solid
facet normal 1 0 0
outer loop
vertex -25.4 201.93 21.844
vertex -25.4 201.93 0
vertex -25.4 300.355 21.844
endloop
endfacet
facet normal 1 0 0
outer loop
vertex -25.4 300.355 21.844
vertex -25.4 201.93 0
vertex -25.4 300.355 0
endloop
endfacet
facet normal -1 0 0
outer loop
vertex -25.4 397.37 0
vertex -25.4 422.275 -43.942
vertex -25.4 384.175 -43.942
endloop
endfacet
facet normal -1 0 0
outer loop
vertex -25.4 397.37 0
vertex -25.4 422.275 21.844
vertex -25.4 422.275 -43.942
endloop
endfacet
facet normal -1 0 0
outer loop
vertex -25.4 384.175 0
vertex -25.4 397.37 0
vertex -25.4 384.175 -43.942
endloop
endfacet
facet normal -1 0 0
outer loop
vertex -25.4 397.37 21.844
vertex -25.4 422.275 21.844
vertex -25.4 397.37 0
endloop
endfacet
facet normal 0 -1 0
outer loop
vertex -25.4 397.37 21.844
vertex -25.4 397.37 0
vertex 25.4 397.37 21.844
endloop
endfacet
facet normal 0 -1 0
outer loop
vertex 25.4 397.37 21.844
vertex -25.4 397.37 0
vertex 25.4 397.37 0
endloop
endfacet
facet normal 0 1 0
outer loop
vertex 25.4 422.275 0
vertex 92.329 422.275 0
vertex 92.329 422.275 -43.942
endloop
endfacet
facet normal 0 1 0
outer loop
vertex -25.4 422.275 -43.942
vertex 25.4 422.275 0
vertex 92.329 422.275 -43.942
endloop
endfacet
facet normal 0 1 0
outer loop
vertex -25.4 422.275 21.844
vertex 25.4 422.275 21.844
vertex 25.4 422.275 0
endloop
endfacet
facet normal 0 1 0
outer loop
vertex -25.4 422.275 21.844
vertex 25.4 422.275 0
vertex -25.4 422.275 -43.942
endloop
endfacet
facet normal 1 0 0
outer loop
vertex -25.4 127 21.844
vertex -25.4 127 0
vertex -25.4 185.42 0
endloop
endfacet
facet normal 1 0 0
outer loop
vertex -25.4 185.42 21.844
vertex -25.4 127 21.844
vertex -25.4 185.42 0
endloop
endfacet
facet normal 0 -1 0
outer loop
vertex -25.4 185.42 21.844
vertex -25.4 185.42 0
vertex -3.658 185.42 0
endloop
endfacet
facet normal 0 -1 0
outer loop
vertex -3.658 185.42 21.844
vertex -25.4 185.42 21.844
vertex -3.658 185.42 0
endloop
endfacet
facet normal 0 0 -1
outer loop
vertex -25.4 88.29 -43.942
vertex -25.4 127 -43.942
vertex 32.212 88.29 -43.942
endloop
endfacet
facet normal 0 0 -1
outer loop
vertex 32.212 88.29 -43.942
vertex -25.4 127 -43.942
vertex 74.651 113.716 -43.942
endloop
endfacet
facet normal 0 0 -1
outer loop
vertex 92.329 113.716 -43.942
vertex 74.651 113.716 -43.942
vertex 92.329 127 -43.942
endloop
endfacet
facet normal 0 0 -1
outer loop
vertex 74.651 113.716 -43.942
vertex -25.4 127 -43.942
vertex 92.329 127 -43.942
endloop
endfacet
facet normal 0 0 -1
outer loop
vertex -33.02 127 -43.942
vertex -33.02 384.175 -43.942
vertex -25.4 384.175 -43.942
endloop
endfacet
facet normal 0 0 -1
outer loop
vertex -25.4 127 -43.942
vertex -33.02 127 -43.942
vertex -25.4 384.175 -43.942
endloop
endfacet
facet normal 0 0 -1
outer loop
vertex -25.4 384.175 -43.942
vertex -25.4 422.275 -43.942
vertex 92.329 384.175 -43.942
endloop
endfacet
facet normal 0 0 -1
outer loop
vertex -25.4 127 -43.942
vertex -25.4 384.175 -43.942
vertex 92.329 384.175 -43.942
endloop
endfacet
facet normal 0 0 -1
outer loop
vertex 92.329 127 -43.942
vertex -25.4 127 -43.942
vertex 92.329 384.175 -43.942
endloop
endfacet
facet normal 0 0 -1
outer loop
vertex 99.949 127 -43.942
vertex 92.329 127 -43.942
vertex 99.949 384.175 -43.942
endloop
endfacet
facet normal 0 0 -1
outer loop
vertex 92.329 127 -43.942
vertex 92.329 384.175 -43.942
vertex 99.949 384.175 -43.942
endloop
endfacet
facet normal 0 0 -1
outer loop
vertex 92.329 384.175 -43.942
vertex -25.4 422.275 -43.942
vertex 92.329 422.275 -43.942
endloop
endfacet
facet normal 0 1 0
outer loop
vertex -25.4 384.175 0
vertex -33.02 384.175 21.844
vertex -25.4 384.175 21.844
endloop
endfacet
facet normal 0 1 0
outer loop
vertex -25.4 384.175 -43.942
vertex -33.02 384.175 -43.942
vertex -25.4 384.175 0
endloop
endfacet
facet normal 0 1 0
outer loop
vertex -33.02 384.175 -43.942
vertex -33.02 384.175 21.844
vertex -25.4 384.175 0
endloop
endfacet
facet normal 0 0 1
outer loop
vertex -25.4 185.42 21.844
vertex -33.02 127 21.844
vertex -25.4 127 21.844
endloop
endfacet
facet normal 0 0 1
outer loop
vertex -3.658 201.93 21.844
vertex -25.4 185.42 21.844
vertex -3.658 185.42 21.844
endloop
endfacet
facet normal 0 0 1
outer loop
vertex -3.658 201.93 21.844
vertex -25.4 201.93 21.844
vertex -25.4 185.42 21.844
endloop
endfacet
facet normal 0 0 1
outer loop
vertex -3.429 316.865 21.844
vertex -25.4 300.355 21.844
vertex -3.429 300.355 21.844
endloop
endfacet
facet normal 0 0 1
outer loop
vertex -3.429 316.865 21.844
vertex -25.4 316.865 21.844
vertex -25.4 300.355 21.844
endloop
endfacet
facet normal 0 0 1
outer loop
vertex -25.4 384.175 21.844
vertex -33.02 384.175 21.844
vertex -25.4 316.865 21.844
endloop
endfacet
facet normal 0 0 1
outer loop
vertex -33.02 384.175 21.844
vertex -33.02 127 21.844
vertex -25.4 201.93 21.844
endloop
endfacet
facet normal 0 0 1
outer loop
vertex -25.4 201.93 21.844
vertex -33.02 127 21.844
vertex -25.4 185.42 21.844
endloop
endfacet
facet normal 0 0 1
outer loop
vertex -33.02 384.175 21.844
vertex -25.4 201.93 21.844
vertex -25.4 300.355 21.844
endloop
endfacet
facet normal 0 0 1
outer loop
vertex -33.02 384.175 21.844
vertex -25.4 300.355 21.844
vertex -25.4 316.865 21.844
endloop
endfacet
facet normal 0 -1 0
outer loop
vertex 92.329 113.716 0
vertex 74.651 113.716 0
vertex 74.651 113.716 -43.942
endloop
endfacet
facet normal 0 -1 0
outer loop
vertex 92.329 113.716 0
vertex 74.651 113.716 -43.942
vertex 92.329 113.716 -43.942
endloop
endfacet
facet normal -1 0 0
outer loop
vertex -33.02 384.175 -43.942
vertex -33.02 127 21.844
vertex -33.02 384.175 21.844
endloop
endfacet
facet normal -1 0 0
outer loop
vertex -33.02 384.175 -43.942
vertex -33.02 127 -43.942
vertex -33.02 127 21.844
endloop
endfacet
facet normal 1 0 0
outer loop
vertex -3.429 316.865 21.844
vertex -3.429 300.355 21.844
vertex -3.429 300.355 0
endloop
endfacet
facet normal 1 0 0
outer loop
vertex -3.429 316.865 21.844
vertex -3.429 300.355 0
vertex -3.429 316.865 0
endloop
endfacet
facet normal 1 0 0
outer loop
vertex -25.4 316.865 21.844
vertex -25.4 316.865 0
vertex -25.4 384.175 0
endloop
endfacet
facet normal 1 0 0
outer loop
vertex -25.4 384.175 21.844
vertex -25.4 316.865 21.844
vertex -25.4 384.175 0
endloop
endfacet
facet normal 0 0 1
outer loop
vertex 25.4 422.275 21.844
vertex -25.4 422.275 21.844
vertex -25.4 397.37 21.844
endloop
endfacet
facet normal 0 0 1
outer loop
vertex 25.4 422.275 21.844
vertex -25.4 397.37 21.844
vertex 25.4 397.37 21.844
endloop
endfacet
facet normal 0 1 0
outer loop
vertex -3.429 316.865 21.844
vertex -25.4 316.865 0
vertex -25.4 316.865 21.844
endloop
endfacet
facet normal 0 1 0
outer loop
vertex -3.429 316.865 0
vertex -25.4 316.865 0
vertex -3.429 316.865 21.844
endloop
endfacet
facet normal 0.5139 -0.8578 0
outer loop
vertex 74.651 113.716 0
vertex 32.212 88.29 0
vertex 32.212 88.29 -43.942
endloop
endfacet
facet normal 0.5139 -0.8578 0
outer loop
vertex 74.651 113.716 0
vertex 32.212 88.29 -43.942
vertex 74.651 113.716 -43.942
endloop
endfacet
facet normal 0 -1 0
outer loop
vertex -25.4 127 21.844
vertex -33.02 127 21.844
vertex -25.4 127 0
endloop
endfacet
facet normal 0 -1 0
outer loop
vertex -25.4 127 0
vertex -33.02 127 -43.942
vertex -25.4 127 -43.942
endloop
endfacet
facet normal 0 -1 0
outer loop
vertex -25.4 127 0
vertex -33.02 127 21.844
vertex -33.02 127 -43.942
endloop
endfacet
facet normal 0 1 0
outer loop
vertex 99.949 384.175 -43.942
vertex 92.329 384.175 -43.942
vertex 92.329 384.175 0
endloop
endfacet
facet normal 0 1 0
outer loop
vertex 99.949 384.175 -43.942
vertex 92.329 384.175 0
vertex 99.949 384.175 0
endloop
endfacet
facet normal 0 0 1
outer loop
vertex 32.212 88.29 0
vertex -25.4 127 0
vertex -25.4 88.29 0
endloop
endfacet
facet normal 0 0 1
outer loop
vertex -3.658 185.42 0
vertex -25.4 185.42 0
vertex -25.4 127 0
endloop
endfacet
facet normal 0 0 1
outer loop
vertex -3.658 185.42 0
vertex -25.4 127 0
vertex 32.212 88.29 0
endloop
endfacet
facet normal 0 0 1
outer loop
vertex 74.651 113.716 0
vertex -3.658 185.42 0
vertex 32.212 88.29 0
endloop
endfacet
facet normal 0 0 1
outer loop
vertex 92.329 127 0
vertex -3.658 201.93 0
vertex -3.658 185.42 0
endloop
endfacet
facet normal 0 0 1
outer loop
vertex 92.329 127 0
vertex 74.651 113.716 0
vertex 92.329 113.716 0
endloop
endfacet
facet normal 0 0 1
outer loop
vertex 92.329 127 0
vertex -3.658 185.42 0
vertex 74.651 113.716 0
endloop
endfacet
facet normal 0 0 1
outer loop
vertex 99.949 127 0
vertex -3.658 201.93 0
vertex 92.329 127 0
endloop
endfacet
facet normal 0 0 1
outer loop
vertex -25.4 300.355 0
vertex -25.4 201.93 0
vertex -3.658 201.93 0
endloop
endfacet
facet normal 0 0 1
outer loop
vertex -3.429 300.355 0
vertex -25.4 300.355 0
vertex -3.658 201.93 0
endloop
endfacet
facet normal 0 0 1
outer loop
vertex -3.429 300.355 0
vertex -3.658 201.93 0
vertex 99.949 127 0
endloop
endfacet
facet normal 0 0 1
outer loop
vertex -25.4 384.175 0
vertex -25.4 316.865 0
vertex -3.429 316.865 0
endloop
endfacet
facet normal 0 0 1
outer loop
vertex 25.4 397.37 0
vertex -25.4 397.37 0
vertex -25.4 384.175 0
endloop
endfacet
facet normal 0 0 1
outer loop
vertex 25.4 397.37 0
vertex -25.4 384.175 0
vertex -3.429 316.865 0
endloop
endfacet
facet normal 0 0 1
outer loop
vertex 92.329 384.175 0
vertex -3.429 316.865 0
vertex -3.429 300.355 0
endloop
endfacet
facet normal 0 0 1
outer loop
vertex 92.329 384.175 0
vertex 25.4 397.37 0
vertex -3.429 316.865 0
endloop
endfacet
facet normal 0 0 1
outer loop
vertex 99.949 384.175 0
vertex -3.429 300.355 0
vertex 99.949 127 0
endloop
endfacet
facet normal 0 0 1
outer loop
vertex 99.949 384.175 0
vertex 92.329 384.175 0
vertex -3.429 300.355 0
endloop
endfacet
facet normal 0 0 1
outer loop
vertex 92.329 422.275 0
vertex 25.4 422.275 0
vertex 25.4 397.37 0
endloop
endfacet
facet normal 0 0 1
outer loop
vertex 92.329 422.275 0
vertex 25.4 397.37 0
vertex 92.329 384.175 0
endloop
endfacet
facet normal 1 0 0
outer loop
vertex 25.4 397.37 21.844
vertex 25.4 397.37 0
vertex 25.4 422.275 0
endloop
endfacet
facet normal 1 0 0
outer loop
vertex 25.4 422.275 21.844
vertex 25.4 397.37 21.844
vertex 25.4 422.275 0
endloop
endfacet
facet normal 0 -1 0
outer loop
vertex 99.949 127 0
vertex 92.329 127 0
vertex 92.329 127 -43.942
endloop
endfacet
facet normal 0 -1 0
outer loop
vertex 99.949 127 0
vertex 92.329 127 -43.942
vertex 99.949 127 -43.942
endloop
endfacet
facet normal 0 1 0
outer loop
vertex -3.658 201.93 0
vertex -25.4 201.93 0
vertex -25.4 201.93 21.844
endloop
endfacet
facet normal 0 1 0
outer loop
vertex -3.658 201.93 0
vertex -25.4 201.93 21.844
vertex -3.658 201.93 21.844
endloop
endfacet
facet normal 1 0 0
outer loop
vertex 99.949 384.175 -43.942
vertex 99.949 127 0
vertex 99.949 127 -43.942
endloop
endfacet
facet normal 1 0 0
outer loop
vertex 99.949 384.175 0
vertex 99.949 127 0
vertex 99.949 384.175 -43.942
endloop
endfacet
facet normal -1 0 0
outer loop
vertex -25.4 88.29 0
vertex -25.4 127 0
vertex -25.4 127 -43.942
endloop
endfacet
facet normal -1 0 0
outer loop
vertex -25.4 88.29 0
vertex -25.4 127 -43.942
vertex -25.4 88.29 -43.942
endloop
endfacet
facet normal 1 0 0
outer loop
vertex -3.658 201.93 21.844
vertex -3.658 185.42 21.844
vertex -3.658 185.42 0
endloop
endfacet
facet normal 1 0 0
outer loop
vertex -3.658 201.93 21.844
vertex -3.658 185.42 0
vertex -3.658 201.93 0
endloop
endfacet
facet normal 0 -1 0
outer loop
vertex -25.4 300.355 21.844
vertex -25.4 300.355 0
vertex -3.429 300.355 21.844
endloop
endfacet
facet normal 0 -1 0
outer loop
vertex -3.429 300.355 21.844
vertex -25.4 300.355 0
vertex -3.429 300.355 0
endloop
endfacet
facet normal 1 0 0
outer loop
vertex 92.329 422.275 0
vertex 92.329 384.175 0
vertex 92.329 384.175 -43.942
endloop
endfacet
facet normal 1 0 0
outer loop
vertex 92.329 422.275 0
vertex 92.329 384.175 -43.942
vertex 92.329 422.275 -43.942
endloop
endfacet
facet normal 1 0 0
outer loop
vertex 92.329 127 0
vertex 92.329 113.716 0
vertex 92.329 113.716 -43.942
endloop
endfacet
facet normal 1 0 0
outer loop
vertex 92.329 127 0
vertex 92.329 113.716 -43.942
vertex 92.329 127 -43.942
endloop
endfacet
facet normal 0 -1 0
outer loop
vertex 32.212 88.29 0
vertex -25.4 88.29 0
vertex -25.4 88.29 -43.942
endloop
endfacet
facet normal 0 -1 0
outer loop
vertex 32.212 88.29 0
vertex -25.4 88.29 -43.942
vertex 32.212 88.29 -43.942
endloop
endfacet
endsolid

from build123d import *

# Parameters (mm, degrees)
BOSS_EXTRUDE1_DEPTH = 43.942
SKETCH2_6_W         = 50.8
SKETCH2_6_H         = 24.9047
BOSS_EXTRUDE3_DEPTH = 21.844


with BuildPart() as part:
    # Sketch2 → Boss-Extrude1 (new body)
    with BuildSketch(Plane.XY):
        Polygon((-25.4, 384.175), (-33.02, 384.175), (-33.02, 127), (-25.4, 127), (-25.4, 88.2904), (32.21228, 88.2904), (74.6506, 113.7158), (92.329, 113.7158), (92.329, 127), (99.949, 127), (99.949, 384.175), (92.329, 384.175), (92.329, 422.275), (-25.4, 422.275), align=None)
    extrude(amount=-BOSS_EXTRUDE1_DEPTH)

    # Sketch2<6> → Boss-Extrude3 (add)
    with BuildSketch(Plane.XY):
        Polygon((-25.4, 316.865), (-25.4, 384.175), (-33.02, 384.175), (-33.02, 127), (-25.4, 127), (-25.4, 185.42), (-3.6576, 185.42), (-3.6576, 201.93), (-25.4, 201.93), (-25.4, 300.355), (-3.429, 300.355), (-3.429, 316.865), align=None)
        with Locations((0, 409.82265)):
            Rectangle(SKETCH2_6_W, SKETCH2_6_H)
    extrude(amount=BOSS_EXTRUDE3_DEPTH)


solid = part.part
